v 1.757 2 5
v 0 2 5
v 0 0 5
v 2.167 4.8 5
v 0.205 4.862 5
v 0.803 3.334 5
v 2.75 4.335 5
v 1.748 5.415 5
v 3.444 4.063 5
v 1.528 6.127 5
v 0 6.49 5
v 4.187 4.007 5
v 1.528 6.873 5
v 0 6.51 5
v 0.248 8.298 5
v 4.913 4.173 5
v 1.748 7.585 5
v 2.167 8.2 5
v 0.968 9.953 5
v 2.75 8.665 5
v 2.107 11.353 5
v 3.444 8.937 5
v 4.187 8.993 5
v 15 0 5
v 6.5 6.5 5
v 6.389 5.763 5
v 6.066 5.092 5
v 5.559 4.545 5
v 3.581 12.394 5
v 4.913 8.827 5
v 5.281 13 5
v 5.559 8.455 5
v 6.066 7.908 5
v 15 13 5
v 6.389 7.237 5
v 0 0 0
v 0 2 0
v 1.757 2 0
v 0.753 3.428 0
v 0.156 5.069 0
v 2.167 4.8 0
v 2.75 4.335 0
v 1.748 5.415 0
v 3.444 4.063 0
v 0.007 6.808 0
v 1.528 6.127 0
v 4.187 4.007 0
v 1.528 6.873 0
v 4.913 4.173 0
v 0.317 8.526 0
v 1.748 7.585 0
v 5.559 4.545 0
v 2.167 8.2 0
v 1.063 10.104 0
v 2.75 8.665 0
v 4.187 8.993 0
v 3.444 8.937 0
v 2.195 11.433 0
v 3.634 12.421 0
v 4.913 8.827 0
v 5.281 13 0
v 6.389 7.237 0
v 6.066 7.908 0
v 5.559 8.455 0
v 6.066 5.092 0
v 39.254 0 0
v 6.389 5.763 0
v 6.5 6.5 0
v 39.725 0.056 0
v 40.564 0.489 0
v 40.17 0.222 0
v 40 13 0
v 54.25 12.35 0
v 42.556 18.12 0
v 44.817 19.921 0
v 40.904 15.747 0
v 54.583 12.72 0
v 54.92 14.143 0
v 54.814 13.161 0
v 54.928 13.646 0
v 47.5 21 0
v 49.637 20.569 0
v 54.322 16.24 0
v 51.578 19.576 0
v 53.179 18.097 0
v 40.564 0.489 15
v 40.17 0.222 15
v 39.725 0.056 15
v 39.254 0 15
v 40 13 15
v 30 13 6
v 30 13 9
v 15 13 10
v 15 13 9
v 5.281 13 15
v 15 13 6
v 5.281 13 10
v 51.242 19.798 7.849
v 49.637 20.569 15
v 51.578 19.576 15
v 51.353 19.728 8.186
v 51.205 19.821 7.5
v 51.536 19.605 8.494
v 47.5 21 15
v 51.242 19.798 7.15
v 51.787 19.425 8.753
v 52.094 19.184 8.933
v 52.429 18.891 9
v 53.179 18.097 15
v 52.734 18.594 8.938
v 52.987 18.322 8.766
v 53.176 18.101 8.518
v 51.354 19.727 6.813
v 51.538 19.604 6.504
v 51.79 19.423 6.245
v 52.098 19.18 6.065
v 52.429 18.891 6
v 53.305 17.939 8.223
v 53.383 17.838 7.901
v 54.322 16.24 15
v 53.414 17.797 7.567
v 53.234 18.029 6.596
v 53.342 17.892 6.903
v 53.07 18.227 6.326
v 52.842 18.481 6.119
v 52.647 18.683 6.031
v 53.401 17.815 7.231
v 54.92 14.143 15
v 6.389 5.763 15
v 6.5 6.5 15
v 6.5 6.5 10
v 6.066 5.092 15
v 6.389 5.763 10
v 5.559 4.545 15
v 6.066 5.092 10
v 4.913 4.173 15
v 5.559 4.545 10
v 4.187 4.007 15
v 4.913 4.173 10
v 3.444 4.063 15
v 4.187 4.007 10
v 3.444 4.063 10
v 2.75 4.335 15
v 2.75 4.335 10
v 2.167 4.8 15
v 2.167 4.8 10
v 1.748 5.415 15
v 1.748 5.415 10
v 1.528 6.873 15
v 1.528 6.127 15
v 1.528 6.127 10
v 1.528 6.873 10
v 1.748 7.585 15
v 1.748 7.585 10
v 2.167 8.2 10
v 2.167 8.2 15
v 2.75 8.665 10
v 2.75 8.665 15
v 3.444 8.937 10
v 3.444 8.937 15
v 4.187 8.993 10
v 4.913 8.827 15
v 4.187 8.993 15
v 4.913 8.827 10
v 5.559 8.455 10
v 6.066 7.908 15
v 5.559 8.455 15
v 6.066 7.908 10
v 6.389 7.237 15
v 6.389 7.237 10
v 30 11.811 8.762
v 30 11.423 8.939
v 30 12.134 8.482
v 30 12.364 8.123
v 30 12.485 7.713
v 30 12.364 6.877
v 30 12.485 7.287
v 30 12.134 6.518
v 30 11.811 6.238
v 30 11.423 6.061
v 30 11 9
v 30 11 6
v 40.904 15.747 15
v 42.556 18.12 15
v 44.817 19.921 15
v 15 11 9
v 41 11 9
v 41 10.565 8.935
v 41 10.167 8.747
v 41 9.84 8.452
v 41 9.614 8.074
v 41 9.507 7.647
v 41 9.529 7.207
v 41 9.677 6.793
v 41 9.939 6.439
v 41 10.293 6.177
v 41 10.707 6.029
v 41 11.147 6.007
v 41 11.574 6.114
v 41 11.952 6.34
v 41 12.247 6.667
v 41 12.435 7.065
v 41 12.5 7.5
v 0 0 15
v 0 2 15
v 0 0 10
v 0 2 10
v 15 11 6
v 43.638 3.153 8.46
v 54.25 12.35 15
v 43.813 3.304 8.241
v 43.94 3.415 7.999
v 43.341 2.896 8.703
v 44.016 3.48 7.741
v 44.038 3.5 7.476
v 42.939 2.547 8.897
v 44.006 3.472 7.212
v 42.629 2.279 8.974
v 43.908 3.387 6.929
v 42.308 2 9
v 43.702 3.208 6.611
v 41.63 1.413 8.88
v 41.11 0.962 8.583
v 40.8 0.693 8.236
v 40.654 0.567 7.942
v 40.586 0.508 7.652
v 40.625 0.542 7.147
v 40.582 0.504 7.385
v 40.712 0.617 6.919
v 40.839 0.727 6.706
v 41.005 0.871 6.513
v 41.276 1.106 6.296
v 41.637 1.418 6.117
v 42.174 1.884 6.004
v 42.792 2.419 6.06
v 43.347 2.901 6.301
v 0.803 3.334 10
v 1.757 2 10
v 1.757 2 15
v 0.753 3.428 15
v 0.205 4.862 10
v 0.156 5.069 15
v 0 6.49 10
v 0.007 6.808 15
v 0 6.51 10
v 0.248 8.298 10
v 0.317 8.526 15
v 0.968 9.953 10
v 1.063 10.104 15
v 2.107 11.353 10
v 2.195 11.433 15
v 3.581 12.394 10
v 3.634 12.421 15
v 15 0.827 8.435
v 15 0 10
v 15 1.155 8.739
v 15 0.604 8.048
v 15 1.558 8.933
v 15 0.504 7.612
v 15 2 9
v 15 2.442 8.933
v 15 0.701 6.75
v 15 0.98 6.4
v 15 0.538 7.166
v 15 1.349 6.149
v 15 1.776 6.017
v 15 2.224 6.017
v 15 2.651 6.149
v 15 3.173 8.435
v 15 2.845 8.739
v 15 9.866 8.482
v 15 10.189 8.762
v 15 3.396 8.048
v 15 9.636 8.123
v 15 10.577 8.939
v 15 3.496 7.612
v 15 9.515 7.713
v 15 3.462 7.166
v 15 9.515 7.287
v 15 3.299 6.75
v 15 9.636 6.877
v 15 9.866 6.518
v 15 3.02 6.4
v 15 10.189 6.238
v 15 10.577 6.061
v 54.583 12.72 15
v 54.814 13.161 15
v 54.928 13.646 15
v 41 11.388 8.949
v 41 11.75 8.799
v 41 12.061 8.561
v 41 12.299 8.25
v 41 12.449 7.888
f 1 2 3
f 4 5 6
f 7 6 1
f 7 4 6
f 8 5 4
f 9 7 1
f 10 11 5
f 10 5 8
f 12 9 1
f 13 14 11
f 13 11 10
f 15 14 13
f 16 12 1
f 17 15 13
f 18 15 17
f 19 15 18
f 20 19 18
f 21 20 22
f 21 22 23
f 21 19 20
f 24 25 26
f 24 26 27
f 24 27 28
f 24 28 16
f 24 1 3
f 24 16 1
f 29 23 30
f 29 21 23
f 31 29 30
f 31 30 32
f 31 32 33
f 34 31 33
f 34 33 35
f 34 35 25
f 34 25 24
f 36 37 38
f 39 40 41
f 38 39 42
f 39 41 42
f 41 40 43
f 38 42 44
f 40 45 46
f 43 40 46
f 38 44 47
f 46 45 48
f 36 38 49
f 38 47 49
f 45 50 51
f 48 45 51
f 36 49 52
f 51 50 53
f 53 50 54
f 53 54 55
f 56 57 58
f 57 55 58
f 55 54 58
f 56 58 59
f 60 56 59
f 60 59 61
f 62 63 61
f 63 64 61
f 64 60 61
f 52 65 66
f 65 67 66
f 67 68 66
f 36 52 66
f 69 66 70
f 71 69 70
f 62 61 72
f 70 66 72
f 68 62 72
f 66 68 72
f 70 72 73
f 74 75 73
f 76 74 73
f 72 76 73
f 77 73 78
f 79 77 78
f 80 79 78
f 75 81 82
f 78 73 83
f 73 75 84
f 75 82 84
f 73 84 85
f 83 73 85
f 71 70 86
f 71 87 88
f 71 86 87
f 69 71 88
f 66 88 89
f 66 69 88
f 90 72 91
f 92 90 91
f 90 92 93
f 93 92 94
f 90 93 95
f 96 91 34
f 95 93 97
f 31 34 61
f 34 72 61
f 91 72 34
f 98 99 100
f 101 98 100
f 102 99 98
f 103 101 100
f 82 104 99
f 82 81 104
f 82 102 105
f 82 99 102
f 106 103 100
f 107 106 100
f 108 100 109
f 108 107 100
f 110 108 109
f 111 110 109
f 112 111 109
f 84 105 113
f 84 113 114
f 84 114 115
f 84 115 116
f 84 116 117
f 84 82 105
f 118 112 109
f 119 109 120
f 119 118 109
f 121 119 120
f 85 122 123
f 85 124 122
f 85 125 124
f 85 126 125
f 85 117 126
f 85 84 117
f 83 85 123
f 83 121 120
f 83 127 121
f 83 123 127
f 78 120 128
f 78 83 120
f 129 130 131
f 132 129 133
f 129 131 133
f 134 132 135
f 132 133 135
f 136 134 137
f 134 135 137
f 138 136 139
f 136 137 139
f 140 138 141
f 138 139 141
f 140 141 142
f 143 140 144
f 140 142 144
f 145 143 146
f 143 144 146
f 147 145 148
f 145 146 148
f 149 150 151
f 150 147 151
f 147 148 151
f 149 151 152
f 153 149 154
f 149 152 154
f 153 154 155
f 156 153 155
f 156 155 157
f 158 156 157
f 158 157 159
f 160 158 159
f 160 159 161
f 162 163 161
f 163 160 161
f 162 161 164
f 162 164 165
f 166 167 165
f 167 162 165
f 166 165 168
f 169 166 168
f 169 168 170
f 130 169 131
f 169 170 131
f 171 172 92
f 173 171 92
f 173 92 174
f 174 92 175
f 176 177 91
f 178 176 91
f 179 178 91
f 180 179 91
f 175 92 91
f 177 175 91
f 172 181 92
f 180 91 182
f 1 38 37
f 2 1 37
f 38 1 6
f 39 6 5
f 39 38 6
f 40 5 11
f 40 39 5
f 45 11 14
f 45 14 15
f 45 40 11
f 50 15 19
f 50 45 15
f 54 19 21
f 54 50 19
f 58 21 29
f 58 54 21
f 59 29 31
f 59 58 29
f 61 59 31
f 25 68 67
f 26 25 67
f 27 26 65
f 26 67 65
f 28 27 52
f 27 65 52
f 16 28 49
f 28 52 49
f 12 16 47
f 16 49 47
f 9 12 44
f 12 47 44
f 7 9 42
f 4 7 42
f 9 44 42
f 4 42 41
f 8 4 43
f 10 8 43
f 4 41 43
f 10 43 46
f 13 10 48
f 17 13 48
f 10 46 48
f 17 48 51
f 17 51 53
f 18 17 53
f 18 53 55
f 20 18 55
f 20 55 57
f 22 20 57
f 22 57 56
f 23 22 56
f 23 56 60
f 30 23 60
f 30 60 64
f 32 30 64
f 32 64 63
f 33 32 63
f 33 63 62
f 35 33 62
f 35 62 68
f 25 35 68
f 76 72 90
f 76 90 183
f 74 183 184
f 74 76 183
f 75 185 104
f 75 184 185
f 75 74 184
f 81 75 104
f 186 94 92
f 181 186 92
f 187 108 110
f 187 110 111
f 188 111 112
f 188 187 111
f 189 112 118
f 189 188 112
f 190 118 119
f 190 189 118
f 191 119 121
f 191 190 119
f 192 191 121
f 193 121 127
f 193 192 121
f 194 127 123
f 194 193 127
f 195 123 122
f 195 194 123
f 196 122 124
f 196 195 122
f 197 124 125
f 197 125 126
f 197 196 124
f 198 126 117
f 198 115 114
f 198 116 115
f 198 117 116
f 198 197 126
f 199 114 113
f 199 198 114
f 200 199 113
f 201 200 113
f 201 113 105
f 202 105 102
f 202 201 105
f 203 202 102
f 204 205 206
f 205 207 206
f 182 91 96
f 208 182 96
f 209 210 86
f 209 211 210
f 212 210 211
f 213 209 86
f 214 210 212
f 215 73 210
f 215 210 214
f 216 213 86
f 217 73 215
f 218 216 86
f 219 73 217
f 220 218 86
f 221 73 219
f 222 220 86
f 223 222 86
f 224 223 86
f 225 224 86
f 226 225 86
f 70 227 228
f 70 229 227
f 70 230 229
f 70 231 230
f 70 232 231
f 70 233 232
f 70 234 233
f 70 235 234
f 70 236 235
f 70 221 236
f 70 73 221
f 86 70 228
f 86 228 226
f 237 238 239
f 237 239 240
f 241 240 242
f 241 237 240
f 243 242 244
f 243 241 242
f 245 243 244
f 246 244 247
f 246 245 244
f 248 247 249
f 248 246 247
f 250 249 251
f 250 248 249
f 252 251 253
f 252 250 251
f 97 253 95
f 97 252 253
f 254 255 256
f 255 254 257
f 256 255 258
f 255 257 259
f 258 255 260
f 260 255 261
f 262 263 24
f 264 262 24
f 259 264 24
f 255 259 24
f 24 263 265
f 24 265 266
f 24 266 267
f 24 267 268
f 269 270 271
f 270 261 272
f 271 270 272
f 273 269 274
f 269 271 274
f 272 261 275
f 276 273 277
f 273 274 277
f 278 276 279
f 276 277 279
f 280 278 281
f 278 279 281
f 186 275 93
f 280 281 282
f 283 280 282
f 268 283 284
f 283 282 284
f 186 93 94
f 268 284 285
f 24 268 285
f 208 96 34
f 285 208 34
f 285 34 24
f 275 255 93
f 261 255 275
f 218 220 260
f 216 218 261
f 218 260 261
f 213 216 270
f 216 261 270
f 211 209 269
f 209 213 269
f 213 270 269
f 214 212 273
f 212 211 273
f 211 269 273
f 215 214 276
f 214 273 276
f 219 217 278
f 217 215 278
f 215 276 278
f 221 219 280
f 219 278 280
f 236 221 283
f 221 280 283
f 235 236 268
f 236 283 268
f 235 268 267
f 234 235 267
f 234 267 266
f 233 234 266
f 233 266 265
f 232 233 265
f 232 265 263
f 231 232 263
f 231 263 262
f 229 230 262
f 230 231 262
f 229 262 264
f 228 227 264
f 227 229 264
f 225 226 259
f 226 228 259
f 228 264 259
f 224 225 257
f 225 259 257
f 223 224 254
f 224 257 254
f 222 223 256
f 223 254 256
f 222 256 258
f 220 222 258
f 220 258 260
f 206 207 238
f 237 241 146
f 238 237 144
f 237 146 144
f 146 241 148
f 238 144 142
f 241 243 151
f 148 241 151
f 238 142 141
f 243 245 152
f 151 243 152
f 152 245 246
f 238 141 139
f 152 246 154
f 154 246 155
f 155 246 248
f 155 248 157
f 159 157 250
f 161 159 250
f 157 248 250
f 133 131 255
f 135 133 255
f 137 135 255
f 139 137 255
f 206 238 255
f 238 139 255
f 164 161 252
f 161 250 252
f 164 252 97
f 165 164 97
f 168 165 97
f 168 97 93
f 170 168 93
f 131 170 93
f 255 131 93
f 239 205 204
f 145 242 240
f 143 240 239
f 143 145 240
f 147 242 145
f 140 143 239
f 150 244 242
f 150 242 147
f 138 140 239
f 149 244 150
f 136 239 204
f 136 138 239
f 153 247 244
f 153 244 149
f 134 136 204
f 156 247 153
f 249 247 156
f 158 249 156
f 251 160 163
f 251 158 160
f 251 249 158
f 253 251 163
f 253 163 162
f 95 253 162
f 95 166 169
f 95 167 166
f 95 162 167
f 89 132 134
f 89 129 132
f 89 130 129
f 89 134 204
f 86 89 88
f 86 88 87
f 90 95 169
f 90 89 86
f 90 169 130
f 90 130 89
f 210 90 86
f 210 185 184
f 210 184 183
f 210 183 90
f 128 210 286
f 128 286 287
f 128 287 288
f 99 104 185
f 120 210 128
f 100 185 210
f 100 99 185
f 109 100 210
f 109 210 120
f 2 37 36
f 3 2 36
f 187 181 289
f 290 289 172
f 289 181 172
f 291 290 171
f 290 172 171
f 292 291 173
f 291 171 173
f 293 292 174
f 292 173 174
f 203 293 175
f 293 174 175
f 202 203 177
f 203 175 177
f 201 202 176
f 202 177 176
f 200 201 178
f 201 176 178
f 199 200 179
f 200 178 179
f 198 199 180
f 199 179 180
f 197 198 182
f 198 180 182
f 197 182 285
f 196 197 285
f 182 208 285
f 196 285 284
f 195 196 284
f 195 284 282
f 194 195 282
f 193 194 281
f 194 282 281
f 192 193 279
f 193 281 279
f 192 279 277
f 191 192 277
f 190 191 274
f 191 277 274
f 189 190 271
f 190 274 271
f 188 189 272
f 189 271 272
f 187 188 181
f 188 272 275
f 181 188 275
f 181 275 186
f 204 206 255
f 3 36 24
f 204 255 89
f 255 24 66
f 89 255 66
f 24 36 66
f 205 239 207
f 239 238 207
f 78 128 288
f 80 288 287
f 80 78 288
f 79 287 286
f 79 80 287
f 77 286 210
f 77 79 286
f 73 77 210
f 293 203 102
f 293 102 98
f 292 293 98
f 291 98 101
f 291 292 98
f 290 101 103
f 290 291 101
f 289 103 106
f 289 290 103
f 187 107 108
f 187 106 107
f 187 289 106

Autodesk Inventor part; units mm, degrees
ref_plane "YZ Plane" through (0, 0, 0) normal (1, 0, 0) x (0, 1, 0)
sketch "Sketch1" plane through (0, 0, 0) normal (0, 0, 1) x (1, 0, 0)
  line L0 (0, 0) -> (39.2539, 0)
  line L1 (40, 13) -> (0, 13)
  line L2 (0, 13) -> (0, 0)
  circle A0 centre (4, 6.5) radius 4
  circle A1 centre (4, 6.5) radius 2.5
  line L3 (8, 13) -> (8, 0)
  arc A2 (5.2813, 13) -> (1.7572, 2) centre (6.6406, 6.5) ccw
  line L4 (40, 0) -> (55, 0)
  line L5 (55, 0) -> (55, 13)
  arc A3 (47.5, 21) -> (40, 13) centre (49.851, 11.2803) ccw
  line L6 (54.25, 12.35) -> (40.5638, 0.4886)
  arc A4 (54.9201, 14.1433) -> (47.5, 21) centre (47, 13.0156) ccw
  arc A5 (39.2539, 0) -> (40.5638, 0.4886) centre (39.2539, 2) ccw
  arc A6 (54.25, 12.35) -> (54.9201, 14.1433) centre (52.9401, 13.8614) ccw
  line L7 (8, 0) -> (8, 2)
  line L8 (8, 2) -> (-2, 2)
  line L9 (-2, 2) -> (-2, 0)
  line L10 (-2, 0) -> (8, 0)
  point P0 (0, 6.5)
  point P1 (0, 2)
  dimension "d2" = 8
  dimension "d0" = 40
  dimension "d3" = 5
  dimension "d4" = 15
  dimension "d5" = 13
  dimension "d7" = 10
  dimension "d8" = 8
  dimension "d9" = 2
  dimension "d10" = 2
  dimension "d11" = 10
extrude "Extrusion1" add sketch "Sketch1" along normal blind 15 contours L2 L8 L3 L0 | L3 L1 A3 A4 A6 L6 A5 L0 | L8 A2 A0 L3 | A2 L1 L3 A0 | A0
ref_plane "Work Plane1" through (5.2813, 23, 0) normal (0, 1, 0) x (1, 0, 0)
sketch "Sketch2" plane through (5.2813, 23, 0) normal (0, 1, 0) x (1, 0, 0)
  line L0 (-5.2813, 0) -> (-5.2813, -15) projected
  line L1 (-5.2813, -7.5) -> (-5.2813, -5)
  line L2 (-5.2813, -7.5) -> (-5.2813, -10)
  line L3 (-5.2813, -5) -> (9.7187, -5)
  line L4 (-5.2813, -10) -> (9.7187, -10)
  line L5 (9.7187, -10) -> (9.7187, -5)
  line L6 (9.7187, -7.5) -> (9.7187, -6)
  line L7 (9.7187, -7.5) -> (9.7187, -9)
  line L8 (9.7187, -9) -> (24.7188, -9)
  line L9 (24.7188, -9) -> (24.7188, -6)
  line L10 (24.7188, -6) -> (9.7187, -6)
  dimension "d15" = 2.5
  dimension "d16" = 2.5
  dimension "d17" = 15
  dimension "d18" = 15
  dimension "d19" = 1.5
  dimension "d20" = 1.5
  dimension "d21" = 15
extrude "Extrusion2" cut sketch "Sketch2" against normal through all contours L3 L5 L4 L0
sketch "Sketch3" plane through (15, 0, 5) normal (-1, 0, 0) x (0, 0, 1)
  line L0 (0, 13) -> (5, 13) projected
  circle A0 centre (2.5, 11) radius 1.5
  circle A1 centre (2.5, 2) radius 1.5
  line L1 (5, 0) -> (0, 0) projected
  point P0 (-5, 0)
  point P1 (2.5, 0)
  dimension "d25" = 3
  dimension "d27" = 3
extrude "Extrusion3" cut sketch "Sketch3" against normal through all contours A1
extrude "Extrusion4" cut sketch "Sketch3" against normal blind 26 contours A0
extrude "Extrusion5" cut sketch "Sketch2" against normal blind 12 contours L10 L9 L8 L5
ref_plane "Work Plane2" through (52.4294, 18.8912, 0) normal (0.678674, 0.7344396, 0) x (-0.7344396, 0.678674, 0)
sketch "Sketch4" plane through (52.4294, 18.8912, 0) normal (0.678674, 0.7344396, 0) x (-0.7344396, 0.678674, 0)
  circle A0 centre (0, 7.5) radius 1.5
  point P0 (25.6853, 0)
  point P1 (5.0516, 15)
  point P2 (-5.0516, 15)
  dimension "d34" = 3
loft "Loft1" cut profiles "Sketch4" section 2 edges at (41, 11, 6)
properties part number "ProjEnAble_Finger"
